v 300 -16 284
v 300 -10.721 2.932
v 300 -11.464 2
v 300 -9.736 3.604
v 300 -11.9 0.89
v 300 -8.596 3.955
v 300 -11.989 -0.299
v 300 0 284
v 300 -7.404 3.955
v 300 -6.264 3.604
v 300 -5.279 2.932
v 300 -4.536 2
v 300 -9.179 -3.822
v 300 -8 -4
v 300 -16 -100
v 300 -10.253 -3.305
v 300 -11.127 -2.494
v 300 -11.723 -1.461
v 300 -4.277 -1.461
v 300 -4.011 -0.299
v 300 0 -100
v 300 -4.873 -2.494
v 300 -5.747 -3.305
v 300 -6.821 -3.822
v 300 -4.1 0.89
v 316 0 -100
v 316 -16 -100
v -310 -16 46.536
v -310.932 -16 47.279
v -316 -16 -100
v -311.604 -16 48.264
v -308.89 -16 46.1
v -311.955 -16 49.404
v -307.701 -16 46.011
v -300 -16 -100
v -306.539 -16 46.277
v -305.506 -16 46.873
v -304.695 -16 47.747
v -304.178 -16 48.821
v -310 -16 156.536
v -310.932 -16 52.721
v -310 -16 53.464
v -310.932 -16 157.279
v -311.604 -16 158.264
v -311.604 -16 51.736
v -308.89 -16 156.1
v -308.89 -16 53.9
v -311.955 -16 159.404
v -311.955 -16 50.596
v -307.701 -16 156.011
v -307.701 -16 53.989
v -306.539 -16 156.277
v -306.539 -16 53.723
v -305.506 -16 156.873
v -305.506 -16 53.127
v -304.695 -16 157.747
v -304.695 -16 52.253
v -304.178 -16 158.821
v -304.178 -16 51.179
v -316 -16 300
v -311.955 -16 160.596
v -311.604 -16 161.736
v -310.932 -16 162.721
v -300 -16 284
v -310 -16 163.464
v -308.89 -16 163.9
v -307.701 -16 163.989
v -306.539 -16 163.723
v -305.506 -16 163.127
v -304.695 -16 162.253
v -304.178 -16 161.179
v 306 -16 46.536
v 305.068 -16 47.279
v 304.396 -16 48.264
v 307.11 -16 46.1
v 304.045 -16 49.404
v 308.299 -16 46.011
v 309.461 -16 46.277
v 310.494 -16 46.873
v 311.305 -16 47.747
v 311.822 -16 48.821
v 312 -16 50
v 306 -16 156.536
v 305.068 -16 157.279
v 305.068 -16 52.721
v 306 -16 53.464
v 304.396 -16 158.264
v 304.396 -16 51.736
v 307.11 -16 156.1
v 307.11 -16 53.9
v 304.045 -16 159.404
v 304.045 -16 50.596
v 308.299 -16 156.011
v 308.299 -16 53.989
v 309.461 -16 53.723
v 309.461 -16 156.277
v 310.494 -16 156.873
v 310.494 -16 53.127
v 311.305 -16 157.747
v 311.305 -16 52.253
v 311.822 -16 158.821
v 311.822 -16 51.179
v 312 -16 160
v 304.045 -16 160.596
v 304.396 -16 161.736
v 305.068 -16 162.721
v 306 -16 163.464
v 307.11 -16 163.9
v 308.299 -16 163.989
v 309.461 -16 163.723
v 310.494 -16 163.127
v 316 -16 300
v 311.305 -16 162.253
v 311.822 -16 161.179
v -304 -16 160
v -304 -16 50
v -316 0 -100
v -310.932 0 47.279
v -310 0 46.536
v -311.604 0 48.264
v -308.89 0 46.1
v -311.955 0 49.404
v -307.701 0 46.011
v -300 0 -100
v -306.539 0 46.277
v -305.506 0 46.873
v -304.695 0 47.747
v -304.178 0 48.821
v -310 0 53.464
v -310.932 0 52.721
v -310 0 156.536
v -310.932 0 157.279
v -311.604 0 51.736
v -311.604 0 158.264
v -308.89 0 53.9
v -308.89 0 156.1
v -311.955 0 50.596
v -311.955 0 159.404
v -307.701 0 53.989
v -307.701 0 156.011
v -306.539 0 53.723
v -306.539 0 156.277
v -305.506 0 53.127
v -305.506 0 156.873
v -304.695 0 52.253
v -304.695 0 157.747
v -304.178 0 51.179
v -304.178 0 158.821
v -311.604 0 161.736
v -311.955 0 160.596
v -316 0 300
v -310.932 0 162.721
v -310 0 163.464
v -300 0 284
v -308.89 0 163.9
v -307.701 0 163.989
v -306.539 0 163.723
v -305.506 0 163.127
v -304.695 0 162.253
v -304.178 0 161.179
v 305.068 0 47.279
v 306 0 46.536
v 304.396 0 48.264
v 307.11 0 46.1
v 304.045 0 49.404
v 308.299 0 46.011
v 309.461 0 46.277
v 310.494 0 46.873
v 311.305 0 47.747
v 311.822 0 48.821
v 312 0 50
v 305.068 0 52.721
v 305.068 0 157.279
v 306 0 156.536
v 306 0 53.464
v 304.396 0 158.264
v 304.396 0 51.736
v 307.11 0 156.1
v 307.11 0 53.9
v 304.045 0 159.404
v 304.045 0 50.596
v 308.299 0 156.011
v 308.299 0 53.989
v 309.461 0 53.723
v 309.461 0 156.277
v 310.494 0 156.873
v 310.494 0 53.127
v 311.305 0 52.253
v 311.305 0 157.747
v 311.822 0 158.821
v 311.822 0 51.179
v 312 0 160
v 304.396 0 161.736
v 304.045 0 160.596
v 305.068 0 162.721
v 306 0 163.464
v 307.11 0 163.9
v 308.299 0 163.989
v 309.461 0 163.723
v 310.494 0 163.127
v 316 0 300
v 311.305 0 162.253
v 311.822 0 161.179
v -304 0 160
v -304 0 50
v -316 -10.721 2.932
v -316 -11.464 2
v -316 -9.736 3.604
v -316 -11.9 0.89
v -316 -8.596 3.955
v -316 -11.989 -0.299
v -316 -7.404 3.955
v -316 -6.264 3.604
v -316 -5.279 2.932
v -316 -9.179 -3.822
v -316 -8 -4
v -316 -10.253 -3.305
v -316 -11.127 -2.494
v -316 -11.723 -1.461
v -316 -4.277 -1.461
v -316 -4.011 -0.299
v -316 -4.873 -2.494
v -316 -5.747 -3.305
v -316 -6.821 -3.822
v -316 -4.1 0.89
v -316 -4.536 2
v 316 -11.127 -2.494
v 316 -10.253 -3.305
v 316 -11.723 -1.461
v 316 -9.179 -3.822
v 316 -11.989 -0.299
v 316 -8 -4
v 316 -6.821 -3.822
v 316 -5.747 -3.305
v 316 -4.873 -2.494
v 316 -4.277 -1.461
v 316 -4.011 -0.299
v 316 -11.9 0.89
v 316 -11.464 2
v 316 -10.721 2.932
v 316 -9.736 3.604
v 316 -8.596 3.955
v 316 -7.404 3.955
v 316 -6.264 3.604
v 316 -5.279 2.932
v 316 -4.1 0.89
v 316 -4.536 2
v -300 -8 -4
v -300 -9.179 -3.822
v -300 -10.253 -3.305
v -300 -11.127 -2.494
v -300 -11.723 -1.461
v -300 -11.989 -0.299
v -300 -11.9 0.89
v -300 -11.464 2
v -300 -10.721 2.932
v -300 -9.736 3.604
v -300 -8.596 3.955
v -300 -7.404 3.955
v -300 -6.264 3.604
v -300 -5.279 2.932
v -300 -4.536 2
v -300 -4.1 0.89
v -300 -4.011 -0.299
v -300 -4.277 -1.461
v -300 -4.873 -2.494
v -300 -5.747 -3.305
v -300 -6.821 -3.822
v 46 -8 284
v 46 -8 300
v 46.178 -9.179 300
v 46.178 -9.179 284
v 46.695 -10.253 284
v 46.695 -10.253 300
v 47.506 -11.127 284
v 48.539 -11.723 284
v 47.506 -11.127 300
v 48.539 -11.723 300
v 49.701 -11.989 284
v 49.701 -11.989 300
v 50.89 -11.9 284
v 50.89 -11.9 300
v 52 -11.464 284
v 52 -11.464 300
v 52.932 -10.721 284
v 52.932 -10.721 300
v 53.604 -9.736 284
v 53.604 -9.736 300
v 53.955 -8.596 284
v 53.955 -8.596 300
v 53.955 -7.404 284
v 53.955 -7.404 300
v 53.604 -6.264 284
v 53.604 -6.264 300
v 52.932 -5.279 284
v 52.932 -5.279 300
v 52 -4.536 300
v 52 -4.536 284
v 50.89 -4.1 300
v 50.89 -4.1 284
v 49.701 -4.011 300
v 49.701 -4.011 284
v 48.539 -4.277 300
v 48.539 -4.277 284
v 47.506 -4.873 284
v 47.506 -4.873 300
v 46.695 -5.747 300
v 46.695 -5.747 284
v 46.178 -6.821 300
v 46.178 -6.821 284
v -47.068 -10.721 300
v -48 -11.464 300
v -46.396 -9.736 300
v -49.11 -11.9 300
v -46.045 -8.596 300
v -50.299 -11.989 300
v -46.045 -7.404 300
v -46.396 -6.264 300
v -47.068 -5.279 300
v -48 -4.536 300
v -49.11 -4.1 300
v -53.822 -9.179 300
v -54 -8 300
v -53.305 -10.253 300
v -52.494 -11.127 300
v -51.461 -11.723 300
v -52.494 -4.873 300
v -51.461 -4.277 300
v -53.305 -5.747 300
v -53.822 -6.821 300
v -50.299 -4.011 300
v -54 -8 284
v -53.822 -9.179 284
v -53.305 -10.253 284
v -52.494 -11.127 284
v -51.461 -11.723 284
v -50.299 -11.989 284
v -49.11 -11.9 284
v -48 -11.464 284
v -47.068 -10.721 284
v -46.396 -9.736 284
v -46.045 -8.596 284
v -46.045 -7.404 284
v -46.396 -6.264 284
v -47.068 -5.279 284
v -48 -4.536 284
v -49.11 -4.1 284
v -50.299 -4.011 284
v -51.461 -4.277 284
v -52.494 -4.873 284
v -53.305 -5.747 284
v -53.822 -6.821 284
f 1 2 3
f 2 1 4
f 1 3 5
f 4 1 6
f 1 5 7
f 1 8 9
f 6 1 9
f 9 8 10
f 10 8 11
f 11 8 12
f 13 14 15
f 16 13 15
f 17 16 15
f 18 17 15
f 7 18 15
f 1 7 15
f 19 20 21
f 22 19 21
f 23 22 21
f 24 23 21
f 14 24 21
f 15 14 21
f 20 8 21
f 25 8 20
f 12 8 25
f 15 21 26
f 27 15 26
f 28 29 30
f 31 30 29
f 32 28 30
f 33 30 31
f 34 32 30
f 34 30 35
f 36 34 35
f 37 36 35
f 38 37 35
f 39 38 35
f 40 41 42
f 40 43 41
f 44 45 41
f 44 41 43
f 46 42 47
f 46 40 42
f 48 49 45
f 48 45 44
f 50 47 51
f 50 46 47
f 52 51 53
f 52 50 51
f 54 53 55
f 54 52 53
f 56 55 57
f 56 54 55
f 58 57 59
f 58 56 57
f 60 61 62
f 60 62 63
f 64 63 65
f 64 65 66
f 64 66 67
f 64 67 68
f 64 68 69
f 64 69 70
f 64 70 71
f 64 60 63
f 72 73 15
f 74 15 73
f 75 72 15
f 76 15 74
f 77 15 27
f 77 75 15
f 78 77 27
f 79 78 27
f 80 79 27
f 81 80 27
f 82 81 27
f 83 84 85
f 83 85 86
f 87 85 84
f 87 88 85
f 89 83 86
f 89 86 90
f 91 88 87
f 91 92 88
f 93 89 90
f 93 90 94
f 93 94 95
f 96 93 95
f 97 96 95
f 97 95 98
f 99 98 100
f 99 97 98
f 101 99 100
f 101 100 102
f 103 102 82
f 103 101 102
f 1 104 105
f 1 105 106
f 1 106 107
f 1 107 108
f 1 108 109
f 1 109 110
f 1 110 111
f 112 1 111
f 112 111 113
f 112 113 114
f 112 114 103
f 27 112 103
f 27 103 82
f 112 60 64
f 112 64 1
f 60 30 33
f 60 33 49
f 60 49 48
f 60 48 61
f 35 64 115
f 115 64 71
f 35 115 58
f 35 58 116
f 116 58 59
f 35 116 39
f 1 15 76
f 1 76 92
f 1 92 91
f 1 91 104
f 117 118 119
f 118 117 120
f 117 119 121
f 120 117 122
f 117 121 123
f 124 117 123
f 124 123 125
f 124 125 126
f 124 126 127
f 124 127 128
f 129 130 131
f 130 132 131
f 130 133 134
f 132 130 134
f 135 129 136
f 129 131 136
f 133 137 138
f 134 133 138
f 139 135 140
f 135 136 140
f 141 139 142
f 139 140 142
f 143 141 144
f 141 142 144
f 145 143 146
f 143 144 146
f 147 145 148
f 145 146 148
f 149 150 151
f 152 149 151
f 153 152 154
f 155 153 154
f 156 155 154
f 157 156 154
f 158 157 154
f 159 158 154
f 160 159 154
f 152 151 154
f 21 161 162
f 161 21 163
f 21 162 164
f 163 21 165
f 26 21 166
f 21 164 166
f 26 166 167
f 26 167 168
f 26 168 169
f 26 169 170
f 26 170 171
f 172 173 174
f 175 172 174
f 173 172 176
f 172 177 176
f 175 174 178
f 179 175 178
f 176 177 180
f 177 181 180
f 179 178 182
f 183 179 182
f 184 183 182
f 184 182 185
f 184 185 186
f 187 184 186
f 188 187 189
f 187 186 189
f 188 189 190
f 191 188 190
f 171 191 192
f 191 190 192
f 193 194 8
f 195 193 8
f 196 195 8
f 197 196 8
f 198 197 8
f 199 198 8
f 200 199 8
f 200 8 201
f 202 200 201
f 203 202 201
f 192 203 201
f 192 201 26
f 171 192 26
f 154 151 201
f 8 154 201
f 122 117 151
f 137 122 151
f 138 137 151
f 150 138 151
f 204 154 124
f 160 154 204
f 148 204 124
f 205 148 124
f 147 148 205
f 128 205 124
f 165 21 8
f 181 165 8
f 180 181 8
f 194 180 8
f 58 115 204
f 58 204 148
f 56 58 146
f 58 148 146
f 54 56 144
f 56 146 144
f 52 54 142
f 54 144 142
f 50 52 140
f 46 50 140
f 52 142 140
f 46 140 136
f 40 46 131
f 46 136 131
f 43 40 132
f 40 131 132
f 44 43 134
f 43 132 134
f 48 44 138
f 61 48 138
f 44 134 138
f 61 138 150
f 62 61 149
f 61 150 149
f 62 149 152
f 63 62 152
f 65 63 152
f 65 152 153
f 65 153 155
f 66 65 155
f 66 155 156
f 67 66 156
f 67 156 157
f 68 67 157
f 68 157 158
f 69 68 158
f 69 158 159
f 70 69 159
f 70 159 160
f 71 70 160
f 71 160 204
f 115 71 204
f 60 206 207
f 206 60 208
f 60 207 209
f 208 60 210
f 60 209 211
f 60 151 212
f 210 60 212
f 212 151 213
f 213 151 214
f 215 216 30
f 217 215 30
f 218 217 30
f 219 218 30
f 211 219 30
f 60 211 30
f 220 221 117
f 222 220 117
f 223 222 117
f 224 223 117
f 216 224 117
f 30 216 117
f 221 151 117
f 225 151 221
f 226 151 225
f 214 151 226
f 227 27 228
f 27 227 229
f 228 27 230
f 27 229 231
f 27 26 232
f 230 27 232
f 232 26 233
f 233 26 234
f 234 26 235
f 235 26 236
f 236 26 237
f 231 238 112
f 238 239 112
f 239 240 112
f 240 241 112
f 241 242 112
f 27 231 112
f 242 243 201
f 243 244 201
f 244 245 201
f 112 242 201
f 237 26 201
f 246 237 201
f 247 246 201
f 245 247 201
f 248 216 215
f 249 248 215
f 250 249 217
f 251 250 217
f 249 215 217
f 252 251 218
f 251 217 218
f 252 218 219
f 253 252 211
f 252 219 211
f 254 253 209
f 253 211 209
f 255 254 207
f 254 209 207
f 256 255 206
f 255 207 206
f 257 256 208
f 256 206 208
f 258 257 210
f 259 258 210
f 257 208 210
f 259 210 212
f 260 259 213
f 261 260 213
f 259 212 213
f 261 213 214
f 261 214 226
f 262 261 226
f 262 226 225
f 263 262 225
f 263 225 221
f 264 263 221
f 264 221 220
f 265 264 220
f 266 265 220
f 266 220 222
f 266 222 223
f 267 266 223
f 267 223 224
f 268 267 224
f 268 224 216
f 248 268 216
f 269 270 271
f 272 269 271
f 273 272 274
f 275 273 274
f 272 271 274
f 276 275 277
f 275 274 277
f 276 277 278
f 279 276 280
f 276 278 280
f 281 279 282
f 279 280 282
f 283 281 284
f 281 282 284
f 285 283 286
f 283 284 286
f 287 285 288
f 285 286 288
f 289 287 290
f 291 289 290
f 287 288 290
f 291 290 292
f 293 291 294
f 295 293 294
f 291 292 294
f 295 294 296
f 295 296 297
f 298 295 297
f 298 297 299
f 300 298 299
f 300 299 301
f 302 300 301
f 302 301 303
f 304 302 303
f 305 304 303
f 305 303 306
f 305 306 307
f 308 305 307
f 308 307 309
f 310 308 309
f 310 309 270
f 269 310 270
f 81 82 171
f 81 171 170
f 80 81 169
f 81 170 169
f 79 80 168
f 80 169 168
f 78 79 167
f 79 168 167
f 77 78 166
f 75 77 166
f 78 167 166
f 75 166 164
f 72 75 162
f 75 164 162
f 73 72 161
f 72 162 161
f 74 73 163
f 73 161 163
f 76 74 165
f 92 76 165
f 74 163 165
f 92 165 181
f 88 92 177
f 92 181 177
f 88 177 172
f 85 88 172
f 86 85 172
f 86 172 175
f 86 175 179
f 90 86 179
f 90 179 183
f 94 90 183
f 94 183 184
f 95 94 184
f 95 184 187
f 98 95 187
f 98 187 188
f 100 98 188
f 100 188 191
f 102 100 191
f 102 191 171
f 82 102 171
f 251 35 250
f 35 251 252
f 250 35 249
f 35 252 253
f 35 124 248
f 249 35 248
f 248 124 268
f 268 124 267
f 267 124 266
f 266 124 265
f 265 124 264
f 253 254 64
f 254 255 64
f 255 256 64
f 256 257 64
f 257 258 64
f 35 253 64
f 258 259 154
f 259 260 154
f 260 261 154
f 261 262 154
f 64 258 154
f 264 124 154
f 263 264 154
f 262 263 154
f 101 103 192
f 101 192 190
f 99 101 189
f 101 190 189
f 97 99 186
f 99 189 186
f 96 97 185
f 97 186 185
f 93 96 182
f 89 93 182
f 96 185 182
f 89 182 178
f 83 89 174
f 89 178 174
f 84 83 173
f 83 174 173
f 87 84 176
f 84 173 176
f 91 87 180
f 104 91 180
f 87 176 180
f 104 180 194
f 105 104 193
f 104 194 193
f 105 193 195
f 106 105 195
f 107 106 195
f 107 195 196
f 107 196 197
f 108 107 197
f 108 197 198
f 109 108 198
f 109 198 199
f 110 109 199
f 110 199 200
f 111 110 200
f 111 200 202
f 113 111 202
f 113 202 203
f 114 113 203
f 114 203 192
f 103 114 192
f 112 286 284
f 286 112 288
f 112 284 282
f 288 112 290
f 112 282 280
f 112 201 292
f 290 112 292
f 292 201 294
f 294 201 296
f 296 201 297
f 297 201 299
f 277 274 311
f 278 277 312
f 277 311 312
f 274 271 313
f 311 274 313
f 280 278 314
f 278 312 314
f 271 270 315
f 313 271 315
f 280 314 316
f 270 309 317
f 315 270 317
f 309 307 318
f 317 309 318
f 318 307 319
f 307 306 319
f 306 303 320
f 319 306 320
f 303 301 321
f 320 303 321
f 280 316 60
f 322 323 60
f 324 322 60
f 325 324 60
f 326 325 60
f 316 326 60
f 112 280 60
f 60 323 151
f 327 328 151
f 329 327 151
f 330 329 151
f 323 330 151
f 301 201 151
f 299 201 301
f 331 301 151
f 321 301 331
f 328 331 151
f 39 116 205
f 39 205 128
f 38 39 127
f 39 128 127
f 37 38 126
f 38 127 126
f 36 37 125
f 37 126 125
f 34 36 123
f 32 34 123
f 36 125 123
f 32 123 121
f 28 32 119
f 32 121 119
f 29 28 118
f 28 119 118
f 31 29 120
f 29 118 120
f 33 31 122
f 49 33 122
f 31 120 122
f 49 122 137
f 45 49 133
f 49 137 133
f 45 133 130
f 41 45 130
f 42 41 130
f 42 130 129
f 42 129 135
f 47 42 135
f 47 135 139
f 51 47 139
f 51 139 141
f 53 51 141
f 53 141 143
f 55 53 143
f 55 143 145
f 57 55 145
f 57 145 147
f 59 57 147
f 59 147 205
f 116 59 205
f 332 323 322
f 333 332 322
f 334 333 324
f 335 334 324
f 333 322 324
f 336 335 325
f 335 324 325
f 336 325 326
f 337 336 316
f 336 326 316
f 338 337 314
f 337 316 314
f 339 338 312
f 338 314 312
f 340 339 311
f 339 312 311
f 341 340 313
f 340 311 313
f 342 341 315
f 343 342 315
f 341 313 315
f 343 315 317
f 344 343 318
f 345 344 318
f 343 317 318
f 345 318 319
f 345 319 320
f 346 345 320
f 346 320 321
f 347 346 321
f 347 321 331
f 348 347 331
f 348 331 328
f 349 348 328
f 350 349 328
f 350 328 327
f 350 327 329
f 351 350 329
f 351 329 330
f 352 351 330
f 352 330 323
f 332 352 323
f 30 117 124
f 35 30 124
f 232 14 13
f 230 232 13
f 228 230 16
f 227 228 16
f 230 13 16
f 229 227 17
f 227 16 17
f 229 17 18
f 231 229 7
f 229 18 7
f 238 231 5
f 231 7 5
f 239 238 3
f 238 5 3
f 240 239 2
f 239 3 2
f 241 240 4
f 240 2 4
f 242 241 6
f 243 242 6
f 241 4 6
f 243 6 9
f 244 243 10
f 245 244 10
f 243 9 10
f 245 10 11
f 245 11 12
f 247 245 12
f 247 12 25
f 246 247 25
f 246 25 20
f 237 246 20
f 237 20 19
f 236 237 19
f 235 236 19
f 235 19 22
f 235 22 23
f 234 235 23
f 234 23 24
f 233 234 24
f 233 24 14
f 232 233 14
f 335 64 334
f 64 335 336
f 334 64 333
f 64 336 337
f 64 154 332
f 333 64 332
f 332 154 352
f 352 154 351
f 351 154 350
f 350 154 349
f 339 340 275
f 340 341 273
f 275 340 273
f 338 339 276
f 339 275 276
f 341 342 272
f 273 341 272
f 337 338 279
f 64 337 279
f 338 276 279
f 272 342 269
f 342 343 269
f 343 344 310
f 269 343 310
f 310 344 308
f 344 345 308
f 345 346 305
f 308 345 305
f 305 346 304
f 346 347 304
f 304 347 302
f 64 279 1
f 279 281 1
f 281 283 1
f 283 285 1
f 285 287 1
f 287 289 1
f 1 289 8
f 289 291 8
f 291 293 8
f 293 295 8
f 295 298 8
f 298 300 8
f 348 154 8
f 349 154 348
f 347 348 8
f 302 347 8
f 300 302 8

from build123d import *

# Parameters (mm, degrees)
PAD_DEPTH       = 16
SKETCH_R        = 4
POCKET_DEPTH    = 632.001
SKETCH002_R     = 4
POCKET001_DEPTH = 400.001
SKETCH003_R     = 4
POCKET002_DEPTH = 16.001
SKETCH004_R     = 4
POCKET003_DEPTH = 16.001


with BuildPart() as part:
    # Sketch001 → Pad (new body)
    with BuildSketch(Plane.XZ):
        Polygon((300, 0), (300, -100), (316, -100), (316, 300), (-316, 300), (-316, -100), (-300, -100), (-300, 0), (-300, 284), (300, 284), align=None)
    extrude(amount=PAD_DEPTH)

    # Sketch (on Face4 of Pad) → Pocket (cut, through all)
    with BuildSketch(Plane(origin=(-316, 0, 0), x_dir=(0, 0, -1), z_dir=(-1, 0, 0))):
        with Locations((0, 8)):
            Circle(SKETCH_R)
    extrude(amount=-POCKET_DEPTH, mode=Mode.SUBTRACT)

    # Sketch002 (on Face8 of Pocket) → Pocket001 (cut, through all)
    with BuildSketch(Plane(origin=(0, 0, 300), x_dir=(-1, 0, 0), z_dir=(0, 0, 1))):
        with Locations((-50, 8)):
            Circle(SKETCH002_R)
        with Locations((50, 8)):
            Circle(SKETCH002_R)
    extrude(amount=-POCKET001_DEPTH, mode=Mode.SUBTRACT)

    # Sketch003 (on Face4 of Pocket001) → Pocket002 (cut, through all)
    with BuildSketch(Plane(origin=(0, 0, 0), x_dir=(1, 0, 0), z_dir=(0, 1, 0))):
        with Locations((308, -50)):
            Circle(SKETCH003_R)
        with Locations((-308, -50)):
            Circle(SKETCH003_R)
    extrude(amount=-POCKET002_DEPTH, mode=Mode.SUBTRACT)

    # Sketch004 (on Face4 of Pocket002) → Pocket003 (cut, through all)
    with BuildSketch(Plane(origin=(0, 0, 0), x_dir=(1, 0, 0), z_dir=(0, 1, 0))):
        with Locations((308, -160)):
            Circle(SKETCH004_R)
        with Locations((-308, -160)):
            Circle(SKETCH004_R)
    extrude(amount=-POCKET003_DEPTH, mode=Mode.SUBTRACT)


solid = part.part
